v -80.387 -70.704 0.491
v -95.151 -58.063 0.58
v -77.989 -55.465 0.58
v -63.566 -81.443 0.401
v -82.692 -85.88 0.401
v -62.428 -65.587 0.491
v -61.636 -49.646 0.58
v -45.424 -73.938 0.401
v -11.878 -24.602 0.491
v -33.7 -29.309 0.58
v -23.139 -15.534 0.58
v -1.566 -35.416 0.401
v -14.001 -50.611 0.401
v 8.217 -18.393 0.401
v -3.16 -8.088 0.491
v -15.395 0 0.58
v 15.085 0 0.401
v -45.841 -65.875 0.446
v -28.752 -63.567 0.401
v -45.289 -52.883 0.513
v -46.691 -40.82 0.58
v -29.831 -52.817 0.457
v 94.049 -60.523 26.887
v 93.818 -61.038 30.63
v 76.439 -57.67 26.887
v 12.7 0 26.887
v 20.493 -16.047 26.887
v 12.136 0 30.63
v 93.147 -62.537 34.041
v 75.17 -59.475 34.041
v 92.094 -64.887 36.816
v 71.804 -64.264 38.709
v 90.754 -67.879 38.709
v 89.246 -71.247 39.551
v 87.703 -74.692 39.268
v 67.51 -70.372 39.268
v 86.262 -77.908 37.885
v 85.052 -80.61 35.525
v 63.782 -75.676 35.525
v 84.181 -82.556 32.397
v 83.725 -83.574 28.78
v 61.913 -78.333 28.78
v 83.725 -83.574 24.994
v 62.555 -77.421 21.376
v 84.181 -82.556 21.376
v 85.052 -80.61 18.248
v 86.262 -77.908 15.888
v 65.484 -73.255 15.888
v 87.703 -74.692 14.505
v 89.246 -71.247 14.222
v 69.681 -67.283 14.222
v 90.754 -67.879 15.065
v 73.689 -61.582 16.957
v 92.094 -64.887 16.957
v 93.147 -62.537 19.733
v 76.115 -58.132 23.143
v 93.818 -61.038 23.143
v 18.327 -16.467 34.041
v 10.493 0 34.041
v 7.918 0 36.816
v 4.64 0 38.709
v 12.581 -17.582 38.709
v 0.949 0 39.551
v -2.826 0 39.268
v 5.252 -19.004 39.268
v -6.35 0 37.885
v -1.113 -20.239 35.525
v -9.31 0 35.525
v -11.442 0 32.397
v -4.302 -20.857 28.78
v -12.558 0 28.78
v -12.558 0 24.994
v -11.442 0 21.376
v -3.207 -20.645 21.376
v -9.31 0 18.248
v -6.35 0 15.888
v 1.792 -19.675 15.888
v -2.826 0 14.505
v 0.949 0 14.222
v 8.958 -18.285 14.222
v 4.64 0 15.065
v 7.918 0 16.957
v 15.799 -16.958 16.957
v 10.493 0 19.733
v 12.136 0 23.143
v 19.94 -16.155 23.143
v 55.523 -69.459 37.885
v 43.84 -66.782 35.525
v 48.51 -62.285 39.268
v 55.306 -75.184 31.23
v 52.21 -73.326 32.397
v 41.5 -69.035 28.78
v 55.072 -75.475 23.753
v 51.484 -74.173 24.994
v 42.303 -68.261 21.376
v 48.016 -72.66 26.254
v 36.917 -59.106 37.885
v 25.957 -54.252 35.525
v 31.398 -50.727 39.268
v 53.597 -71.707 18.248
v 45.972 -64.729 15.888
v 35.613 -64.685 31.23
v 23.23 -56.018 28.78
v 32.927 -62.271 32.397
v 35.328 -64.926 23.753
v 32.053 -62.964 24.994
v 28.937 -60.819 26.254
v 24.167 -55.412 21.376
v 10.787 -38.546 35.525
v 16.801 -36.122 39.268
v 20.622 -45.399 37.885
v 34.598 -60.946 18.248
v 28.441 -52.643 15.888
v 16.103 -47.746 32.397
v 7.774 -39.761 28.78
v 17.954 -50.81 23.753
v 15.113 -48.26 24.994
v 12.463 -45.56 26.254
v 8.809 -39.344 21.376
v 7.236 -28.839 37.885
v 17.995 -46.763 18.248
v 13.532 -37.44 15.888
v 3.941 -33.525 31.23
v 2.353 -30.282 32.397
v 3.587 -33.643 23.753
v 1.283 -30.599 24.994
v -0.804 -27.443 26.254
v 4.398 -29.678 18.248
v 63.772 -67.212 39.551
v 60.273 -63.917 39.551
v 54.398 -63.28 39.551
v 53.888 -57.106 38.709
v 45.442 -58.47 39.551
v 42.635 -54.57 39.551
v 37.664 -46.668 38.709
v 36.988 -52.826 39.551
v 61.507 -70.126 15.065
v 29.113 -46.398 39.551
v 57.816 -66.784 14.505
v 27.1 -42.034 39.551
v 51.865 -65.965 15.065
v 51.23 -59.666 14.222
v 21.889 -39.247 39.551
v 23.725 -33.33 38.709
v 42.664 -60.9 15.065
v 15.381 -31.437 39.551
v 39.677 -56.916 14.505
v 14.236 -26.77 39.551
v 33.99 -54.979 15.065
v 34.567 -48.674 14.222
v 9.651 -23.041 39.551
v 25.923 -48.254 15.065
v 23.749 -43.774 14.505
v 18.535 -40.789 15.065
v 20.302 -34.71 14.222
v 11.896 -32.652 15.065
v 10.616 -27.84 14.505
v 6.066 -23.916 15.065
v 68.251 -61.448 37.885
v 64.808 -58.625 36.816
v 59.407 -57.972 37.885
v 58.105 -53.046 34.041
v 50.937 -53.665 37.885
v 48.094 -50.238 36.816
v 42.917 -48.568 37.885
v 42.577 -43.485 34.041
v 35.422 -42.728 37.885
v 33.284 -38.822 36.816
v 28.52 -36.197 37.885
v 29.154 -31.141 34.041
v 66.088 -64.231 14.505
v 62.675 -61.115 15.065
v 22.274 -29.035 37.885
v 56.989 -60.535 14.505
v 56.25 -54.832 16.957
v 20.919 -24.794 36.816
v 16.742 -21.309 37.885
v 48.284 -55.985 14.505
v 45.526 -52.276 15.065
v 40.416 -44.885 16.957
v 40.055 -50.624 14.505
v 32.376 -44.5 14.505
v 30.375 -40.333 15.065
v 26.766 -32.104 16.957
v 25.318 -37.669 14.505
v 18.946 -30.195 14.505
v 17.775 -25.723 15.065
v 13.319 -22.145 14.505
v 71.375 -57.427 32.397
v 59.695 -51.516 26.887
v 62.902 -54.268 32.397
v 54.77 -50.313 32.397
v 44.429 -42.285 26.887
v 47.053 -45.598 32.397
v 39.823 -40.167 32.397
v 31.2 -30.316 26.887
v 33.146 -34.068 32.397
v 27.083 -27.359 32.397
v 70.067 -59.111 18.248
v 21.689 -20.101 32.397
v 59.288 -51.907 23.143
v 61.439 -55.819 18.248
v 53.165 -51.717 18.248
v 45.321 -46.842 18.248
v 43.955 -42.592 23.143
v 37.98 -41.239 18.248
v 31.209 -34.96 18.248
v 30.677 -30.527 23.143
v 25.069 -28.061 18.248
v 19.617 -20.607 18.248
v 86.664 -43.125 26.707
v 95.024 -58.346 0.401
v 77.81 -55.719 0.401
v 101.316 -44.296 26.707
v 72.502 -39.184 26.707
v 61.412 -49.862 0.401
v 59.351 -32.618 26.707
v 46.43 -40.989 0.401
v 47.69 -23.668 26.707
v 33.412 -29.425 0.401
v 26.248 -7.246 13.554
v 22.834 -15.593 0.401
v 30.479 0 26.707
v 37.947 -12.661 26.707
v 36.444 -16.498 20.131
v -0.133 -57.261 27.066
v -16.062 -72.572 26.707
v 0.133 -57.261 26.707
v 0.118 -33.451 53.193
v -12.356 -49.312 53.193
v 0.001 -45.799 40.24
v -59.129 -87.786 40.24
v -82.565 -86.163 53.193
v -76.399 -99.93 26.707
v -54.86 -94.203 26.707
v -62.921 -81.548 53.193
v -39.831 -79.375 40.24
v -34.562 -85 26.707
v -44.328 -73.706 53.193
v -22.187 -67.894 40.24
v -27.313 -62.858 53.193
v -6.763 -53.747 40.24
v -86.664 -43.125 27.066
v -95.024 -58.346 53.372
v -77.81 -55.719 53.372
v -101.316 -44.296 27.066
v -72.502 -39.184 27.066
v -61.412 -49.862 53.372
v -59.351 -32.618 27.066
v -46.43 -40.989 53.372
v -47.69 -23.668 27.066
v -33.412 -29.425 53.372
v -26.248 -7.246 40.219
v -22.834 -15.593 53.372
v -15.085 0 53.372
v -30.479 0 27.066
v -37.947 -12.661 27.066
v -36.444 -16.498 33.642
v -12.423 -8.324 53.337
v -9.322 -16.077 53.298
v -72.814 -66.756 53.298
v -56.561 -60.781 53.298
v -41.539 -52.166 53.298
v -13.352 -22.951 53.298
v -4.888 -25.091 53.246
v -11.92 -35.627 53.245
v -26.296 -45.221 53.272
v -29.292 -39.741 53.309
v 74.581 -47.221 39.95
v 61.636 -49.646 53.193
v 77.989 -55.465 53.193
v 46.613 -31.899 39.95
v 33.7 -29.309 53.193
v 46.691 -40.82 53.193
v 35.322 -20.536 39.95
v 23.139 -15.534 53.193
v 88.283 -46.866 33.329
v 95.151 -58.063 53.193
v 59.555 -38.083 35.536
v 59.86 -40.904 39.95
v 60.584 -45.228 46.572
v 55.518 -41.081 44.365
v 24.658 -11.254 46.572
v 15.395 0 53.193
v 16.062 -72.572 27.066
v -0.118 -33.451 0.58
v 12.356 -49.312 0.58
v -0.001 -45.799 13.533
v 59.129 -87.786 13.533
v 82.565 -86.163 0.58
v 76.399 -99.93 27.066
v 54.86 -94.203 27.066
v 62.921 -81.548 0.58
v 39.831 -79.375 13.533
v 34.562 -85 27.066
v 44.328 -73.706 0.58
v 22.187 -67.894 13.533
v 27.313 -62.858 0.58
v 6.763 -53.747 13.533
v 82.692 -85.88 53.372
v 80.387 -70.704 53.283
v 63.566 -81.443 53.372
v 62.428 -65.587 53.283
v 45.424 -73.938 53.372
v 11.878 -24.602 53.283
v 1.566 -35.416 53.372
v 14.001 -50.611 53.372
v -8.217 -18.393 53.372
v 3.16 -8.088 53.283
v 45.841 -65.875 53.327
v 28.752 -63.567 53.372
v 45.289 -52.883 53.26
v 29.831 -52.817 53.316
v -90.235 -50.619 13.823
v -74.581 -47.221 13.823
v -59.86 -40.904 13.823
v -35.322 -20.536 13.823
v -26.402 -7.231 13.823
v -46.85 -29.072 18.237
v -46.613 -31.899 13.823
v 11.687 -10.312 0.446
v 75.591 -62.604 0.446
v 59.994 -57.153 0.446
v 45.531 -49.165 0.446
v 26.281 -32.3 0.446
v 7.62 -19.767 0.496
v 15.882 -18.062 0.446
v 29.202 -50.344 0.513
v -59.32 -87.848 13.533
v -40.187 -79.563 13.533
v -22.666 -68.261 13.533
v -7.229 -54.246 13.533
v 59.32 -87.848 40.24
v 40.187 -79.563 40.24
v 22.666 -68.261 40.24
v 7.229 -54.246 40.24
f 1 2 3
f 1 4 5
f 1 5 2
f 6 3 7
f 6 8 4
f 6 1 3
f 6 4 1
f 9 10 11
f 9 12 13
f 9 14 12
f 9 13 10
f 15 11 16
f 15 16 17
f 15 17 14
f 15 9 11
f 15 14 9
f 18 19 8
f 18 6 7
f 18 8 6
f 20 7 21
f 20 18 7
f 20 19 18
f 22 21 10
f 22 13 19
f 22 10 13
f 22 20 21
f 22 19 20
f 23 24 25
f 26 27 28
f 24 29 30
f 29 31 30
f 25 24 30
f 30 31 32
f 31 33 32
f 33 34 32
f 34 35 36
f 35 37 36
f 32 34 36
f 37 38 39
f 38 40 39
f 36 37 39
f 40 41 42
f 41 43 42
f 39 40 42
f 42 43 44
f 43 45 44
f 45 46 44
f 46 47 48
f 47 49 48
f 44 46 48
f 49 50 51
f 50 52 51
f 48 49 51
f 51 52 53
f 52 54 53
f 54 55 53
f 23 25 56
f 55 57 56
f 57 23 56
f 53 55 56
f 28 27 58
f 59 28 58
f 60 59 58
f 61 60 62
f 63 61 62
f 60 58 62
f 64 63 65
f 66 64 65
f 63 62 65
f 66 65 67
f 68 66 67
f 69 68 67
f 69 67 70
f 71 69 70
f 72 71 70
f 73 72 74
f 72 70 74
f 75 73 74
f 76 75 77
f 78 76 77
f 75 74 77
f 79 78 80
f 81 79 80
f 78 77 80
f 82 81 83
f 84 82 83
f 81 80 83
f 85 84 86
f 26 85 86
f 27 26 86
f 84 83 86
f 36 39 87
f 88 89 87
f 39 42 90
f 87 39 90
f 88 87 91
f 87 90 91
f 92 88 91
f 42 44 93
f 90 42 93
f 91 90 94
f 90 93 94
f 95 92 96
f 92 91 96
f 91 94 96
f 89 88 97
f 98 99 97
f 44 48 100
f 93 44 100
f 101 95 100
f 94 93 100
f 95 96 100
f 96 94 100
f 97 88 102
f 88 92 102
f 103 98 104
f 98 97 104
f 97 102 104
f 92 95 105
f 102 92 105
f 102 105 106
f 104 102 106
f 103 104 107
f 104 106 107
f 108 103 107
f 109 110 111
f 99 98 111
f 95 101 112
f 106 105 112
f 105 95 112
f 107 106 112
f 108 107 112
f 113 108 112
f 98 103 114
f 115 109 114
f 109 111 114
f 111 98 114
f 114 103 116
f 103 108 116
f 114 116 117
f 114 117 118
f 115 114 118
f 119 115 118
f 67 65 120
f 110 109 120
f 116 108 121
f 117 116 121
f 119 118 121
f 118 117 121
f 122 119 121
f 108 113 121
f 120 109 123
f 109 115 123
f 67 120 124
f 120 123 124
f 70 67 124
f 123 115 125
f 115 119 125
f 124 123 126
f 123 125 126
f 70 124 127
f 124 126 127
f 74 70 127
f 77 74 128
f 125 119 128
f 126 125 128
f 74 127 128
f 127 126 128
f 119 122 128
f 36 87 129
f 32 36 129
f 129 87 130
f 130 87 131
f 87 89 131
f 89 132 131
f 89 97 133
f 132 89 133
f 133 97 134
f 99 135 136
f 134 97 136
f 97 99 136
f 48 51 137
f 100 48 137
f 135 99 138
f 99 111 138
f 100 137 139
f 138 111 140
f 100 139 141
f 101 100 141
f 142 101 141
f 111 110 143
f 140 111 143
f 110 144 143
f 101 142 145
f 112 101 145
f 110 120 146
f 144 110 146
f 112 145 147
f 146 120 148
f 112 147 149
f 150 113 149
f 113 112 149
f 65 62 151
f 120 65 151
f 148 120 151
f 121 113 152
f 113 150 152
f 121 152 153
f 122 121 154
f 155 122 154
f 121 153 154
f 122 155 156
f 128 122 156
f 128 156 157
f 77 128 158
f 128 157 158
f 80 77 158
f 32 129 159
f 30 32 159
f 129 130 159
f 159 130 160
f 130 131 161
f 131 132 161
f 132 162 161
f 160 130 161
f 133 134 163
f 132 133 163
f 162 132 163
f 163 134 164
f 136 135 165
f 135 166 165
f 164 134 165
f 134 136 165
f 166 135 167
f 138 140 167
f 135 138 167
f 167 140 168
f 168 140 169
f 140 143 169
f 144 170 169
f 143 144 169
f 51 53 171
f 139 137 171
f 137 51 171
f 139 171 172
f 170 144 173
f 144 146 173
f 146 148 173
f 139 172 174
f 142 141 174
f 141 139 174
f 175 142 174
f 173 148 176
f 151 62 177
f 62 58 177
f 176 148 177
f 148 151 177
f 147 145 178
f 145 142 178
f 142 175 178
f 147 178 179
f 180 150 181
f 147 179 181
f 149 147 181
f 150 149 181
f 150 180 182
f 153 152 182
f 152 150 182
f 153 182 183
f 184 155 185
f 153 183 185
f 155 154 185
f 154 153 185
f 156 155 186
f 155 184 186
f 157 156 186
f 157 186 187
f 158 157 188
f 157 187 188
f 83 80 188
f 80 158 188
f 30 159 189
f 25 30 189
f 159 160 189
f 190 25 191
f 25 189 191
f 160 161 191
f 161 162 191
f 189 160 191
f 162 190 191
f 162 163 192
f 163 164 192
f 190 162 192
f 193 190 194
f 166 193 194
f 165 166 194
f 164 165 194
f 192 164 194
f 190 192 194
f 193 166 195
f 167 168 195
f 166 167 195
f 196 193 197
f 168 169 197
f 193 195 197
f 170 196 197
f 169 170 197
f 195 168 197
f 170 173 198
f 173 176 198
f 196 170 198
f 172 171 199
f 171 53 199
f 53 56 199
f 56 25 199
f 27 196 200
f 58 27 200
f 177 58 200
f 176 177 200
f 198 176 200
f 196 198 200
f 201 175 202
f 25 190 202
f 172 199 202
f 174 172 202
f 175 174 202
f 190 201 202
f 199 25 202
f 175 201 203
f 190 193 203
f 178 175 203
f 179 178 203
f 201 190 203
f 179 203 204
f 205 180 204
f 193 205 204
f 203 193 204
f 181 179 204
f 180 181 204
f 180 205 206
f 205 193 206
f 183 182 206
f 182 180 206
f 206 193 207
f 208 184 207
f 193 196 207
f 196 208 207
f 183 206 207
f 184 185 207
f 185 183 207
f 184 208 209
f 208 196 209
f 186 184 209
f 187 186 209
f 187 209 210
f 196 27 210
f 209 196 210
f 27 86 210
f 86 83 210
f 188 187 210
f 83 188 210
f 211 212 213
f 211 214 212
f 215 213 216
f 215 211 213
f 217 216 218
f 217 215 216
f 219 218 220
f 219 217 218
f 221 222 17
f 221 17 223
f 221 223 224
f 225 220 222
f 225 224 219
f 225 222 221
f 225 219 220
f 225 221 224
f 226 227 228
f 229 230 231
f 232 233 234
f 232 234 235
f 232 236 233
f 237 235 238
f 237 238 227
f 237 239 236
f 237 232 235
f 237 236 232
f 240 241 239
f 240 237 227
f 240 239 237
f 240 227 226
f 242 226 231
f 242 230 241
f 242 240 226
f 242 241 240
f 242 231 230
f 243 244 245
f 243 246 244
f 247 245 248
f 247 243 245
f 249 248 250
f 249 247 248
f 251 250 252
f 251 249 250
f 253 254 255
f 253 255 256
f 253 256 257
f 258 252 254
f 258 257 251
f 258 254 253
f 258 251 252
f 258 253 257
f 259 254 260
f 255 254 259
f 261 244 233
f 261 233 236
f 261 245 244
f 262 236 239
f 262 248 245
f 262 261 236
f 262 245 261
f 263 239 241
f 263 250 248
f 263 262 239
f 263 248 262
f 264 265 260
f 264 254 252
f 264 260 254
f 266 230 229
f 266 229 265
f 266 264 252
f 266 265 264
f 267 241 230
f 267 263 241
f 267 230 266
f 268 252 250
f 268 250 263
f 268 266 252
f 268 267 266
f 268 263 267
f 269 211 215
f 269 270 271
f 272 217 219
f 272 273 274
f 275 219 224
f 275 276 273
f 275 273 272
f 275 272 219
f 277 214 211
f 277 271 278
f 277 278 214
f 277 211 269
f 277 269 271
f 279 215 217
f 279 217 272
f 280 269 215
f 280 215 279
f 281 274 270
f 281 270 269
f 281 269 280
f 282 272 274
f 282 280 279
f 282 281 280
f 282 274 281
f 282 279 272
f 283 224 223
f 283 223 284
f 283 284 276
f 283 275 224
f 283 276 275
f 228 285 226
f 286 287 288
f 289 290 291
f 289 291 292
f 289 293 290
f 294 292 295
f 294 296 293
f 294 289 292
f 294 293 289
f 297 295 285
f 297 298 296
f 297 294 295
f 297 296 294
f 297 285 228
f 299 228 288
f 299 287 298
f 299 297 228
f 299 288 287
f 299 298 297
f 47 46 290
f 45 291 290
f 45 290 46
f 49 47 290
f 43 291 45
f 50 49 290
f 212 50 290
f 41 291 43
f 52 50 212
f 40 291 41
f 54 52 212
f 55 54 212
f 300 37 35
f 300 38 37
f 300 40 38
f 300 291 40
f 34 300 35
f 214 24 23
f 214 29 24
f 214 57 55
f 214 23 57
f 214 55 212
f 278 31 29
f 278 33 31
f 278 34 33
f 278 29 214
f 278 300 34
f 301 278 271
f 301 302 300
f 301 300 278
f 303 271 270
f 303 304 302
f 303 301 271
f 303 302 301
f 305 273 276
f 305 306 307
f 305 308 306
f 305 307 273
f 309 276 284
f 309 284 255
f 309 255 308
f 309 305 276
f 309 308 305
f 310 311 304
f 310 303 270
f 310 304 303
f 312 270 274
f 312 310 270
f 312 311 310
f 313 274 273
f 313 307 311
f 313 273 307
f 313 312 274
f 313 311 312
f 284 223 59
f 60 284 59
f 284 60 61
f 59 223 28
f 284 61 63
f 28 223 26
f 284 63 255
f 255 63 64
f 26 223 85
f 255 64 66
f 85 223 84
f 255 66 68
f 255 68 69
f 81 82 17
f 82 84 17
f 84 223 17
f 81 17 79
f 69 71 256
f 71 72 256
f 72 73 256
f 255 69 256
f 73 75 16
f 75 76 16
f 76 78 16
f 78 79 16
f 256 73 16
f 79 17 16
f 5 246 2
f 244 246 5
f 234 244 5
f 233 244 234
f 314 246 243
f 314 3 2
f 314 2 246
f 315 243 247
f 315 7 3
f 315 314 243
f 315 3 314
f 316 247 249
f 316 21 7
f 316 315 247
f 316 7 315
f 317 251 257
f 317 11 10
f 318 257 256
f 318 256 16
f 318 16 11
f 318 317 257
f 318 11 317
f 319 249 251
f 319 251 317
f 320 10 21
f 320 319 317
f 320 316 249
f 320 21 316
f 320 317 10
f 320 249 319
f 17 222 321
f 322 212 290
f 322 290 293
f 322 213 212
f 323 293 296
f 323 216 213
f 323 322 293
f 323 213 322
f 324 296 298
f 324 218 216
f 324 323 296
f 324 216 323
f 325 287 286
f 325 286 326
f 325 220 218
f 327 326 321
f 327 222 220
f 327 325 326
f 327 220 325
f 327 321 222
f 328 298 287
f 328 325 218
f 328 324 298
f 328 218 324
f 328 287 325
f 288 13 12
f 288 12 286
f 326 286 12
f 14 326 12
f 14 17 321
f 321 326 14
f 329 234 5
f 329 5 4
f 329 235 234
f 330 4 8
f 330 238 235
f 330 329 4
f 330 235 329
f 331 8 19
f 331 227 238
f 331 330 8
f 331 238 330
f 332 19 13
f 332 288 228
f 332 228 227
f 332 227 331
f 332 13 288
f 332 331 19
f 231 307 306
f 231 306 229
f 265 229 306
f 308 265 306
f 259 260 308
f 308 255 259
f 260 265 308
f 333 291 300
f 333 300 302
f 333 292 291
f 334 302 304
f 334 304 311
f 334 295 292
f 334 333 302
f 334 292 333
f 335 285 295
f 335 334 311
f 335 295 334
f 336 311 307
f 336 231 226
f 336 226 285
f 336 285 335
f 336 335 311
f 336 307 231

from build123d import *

# Parameters (mm, degrees)
F0_R = 12.7


with BuildPart() as f2:
    # F2: sweep along a path in F1
    with BuildLine(Plane.XY) as f2_path:
        ThreePointArc((88.857807, -72.113179), (33.770109, -49.190349), (0, 0))
    # F0 (on Front) → F2 (sweep)
    with BuildSketch(Plane.XZ):
        Polygon((-30.479473, 27.065896), (-15.394954, 0.580283), (15.084519, 0.401054), (30.479473, 26.707437), (15.394954, 53.19305), (-15.084519, 53.372279), align=None)
        with Locations((0, 26.886667)):
            Circle(F0_R, mode=Mode.SUBTRACT)
        with Locations((0, 26.886667)):
            Circle(F0_R)
    sweep(path=f2_path.line)

    # F3: sweep along a path in F1
    with BuildLine(Plane.XY) as f3_path:
        ThreePointArc((-88.857807, -72.113179), (-33.770109, -49.190349), (0, 0))
    # F0 (on Front) → F3 (sweep)
    with BuildSketch(Plane.XZ):
        Polygon((-30.479473, 27.065896), (-15.394954, 0.580283), (15.084519, 0.401054), (30.479473, 26.707437), (15.394954, 53.19305), (-15.084519, 53.372279), align=None)
        with Locations((0, 26.886667)):
            Circle(F0_R, mode=Mode.SUBTRACT)
        with Locations((0, 26.886667)):
            Circle(F0_R)
    sweep(path=f3_path.line)

    # F4: sweep along a path in F1
    with BuildLine(Plane.XY) as f4_path:
        ThreePointArc((88.857807, -72.113179), (33.770109, -49.190349), (0, 0))
    # F0 (on Front) → F4 (sweep, cut)
    with BuildSketch(Plane.XZ):
        with Locations((0, 26.886667)):
            Circle(F0_R)
    sweep(path=f4_path.line, mode=Mode.SUBTRACT)


solid = f2.part
